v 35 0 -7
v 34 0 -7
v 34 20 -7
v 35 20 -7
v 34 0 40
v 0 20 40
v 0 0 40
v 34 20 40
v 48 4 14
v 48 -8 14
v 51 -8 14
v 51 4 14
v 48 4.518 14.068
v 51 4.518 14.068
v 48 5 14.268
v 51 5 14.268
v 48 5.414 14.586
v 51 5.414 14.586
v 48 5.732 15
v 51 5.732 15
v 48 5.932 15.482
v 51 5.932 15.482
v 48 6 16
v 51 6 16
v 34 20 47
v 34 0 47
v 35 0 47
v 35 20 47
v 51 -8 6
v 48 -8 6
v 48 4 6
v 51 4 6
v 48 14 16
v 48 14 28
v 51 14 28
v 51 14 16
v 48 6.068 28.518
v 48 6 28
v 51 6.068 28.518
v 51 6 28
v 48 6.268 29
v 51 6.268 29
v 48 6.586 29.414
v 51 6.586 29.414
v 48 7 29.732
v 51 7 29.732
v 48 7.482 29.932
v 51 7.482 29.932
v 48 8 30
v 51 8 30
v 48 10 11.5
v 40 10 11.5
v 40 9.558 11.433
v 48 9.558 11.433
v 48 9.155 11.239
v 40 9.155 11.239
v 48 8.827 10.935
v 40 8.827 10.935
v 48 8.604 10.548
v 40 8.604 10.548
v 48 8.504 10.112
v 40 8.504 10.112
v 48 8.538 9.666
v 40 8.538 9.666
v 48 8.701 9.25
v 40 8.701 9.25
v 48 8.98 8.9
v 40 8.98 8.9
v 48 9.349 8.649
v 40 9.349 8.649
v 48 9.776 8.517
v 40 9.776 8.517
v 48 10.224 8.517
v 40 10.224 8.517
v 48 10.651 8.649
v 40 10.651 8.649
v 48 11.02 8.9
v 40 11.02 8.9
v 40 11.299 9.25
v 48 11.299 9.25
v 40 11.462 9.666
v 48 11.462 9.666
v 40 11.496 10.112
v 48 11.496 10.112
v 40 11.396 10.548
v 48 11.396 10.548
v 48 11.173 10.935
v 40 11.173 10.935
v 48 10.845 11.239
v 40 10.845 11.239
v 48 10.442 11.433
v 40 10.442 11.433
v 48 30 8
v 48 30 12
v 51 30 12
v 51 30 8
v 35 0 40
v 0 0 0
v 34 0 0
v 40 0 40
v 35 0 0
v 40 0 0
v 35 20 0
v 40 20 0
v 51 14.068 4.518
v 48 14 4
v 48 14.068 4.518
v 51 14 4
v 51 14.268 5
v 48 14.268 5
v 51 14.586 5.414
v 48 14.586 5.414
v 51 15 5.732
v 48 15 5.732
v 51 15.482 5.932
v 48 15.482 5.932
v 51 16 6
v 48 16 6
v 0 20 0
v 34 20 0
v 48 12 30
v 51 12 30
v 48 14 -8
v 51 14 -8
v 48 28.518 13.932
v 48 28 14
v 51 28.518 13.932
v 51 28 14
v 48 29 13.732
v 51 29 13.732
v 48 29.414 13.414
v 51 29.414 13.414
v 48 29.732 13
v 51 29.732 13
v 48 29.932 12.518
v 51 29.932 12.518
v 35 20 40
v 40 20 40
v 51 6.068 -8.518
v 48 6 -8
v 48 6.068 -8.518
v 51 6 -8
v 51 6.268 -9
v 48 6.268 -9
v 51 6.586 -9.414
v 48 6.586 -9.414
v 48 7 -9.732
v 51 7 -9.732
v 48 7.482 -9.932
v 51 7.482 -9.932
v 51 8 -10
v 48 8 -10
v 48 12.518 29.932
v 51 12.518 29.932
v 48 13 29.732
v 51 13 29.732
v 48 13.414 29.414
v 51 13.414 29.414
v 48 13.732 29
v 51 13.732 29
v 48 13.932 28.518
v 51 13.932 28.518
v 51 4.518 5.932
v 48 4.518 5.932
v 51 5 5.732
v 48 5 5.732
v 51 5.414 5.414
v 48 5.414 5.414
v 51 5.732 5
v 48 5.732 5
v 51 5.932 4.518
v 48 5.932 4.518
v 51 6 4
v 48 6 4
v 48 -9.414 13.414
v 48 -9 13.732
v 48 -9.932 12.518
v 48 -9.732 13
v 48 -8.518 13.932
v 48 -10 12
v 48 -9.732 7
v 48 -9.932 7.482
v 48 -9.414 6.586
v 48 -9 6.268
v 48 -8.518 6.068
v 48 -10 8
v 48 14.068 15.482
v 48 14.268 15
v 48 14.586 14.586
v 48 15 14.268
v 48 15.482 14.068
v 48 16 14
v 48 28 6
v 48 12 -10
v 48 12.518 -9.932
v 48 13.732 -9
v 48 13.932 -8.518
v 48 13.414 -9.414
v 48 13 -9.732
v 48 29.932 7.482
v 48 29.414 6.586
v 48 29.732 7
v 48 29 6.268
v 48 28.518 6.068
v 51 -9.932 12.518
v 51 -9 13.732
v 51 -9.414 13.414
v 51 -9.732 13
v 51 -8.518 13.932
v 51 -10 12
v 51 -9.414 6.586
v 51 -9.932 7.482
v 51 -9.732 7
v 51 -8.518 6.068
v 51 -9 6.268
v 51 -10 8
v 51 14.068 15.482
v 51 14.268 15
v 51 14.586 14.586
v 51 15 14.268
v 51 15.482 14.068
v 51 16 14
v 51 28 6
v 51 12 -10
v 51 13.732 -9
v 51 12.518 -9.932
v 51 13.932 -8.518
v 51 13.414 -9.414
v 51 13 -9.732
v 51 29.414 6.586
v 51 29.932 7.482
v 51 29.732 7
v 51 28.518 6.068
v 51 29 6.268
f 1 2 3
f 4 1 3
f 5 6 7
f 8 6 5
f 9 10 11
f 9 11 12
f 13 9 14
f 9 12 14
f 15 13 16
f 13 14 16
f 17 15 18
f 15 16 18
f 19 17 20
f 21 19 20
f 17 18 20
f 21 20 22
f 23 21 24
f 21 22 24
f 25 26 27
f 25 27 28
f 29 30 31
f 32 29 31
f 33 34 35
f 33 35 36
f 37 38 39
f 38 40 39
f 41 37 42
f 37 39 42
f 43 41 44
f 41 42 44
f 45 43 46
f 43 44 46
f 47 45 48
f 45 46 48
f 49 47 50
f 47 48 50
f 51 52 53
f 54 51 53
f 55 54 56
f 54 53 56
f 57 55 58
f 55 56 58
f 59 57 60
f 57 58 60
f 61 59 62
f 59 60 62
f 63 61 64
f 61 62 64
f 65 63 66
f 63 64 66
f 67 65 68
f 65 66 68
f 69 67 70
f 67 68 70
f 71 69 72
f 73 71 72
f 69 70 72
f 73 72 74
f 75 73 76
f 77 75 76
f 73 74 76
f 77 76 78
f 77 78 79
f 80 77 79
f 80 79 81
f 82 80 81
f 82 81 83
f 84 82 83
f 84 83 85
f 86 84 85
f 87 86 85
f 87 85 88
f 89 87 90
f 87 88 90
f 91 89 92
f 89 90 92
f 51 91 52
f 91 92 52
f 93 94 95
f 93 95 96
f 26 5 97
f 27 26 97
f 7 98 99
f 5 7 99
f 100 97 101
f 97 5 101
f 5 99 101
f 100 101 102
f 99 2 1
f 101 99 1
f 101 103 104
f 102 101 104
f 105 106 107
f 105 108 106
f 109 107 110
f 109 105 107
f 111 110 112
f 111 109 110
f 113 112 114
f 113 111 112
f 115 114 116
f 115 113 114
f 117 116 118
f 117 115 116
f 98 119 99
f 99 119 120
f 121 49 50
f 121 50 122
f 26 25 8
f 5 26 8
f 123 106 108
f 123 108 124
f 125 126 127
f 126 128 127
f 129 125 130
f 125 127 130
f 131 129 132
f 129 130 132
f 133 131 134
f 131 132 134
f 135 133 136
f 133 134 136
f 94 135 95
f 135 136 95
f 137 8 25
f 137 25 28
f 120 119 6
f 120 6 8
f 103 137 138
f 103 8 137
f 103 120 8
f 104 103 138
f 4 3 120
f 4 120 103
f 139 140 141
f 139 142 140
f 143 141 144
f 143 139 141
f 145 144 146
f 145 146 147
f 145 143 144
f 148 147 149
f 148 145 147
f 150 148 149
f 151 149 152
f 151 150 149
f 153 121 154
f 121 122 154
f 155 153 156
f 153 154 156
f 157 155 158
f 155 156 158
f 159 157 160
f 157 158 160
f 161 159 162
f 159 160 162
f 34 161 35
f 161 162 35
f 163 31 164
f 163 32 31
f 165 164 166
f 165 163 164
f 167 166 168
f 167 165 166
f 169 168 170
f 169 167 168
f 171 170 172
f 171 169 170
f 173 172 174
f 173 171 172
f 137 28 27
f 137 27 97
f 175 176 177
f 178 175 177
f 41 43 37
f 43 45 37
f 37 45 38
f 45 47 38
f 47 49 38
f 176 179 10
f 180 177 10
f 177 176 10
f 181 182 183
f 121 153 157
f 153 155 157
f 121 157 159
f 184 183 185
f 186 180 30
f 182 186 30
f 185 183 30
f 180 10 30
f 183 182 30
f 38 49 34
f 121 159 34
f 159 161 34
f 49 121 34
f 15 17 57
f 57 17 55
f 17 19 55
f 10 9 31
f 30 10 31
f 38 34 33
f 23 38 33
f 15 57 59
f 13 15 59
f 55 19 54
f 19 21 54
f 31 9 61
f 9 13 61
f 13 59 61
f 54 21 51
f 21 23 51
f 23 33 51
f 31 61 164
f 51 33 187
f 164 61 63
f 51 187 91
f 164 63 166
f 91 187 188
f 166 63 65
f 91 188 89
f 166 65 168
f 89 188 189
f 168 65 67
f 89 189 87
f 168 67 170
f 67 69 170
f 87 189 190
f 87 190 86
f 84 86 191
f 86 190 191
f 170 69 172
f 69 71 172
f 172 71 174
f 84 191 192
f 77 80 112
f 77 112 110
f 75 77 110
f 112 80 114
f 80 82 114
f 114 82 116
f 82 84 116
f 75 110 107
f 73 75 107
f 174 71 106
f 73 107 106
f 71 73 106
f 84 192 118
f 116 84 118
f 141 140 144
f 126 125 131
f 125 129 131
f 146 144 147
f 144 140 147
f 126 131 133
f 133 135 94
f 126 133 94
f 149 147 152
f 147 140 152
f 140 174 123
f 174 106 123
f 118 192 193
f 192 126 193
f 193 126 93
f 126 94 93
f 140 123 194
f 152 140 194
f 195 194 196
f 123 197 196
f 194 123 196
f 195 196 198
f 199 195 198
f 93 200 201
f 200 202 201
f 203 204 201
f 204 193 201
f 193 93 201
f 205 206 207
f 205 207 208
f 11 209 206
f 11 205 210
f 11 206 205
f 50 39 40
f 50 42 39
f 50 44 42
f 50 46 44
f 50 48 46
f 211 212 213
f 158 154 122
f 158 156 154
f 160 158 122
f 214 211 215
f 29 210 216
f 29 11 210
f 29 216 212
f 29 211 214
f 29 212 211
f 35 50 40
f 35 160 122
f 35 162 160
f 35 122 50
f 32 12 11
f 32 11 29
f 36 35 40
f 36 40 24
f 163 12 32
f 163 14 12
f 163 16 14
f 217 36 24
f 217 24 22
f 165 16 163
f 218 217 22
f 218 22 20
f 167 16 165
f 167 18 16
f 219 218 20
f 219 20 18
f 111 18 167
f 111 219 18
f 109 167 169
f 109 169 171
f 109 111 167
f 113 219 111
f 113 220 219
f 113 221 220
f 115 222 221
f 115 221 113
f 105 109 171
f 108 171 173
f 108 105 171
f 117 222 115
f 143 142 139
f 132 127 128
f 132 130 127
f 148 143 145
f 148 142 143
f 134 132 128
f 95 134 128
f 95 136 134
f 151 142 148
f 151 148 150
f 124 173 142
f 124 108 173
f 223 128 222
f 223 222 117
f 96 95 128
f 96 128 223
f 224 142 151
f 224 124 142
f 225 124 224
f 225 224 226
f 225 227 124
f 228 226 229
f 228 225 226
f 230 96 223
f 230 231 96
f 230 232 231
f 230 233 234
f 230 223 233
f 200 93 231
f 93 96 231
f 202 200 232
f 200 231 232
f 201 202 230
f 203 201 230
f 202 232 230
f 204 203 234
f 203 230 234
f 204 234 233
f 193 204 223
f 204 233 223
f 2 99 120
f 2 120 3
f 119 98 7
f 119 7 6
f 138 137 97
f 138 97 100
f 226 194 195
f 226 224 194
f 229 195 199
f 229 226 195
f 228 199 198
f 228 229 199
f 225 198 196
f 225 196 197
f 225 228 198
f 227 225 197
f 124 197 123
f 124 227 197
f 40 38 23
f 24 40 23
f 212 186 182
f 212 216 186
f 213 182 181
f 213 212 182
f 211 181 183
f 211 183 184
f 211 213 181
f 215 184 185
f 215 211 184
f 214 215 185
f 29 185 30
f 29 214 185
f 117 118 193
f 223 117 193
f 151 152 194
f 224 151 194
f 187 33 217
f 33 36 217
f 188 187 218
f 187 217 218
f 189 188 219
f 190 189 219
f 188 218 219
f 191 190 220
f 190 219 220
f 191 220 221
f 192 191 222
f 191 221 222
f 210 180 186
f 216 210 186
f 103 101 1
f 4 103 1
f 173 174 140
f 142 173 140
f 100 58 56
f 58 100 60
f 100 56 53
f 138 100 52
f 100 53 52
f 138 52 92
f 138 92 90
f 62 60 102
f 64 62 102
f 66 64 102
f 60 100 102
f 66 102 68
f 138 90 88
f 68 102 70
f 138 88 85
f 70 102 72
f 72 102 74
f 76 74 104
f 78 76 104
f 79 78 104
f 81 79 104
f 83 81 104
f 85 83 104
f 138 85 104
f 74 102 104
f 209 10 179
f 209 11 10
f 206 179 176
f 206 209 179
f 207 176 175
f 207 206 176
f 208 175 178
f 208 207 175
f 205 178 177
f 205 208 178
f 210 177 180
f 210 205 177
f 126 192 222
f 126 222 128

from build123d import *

# Parameters (mm, degrees)
SKETCH1_W           = 40
SKETCH1_H           = 20
BOSS_EXTRUDE1_DEPTH = 40
SKETCH2_R           = 1.5
BOSS_EXTRUDE2_DEPTH = 8
SKETCH4_W           = 8
SKETCH4_H           = 40
SKETCH4_W_2         = 40
SKETCH4_H_2         = 8
BOSS_EXTRUDE4_DEPTH = 3
FILLET1_R           = 2
SKETCH6_W           = 7
SKETCH6_H           = 20
BOSS_EXTRUDE5_DEPTH = 1


with BuildPart() as part:
    # Sketch1 → Boss-Extrude1 (new body)
    with BuildSketch(Plane.XY):
        with Locations((20, 10)):
            Rectangle(SKETCH1_W, SKETCH1_H)
    extrude(amount=BOSS_EXTRUDE1_DEPTH)

    # Sketch2 → Boss-Extrude2 (add)
    with BuildSketch(Plane(origin=(40, 0, 0), x_dir=(0, 0, -1), z_dir=(1, 0, 0))):
        with Locations(Location((-10, 10, 0), (0, 0, 180))):
            Circle(SKETCH2_R)
    extrude(amount=BOSS_EXTRUDE2_DEPTH)

    # Sketch4 → Boss-Extrude4 (add)
    with BuildSketch(Plane(origin=(48, 0, 0), x_dir=(0, 0, -1), z_dir=(1, 0, 0))):
        with Locations((-10, 10)):
            Rectangle(SKETCH4_W, SKETCH4_H)
        with Locations((-10, 10)):
            Rectangle(SKETCH4_W_2, SKETCH4_H_2)
    extrude(amount=BOSS_EXTRUDE4_DEPTH)

    # Fillet1
    fillet1_edges = [part.edges().sort_by_distance(p)[0] for p in [
        (49.5, 14, 30),
        (49.5, 6, 14),
        (49.5, 6, 30),
        (49.5, 6, -10),
        (49.5, 14, 6),
        (49.5, 14, -10),
        (49.5, 30, 6),
        (49.5, 14, 14),
        (49.5, 30, 14),
        (49.5, -10, 14),
        (49.5, 6, 6),
        (49.5, -10, 6),
    ]]
    fillet(fillet1_edges, radius=FILLET1_R)

    # Sketch6 → Boss-Extrude5 (add)
    with BuildSketch(Plane(origin=(34, 0, 0), x_dir=(0, 0, -1), z_dir=(1, 0, 0))):
        with Locations((-43.5, 10)):
            Rectangle(SKETCH6_W, SKETCH6_H)
        with Locations((3.5, 10)):
            Rectangle(SKETCH6_W, SKETCH6_H)
    extrude(amount=BOSS_EXTRUDE5_DEPTH)


solid = part.part
